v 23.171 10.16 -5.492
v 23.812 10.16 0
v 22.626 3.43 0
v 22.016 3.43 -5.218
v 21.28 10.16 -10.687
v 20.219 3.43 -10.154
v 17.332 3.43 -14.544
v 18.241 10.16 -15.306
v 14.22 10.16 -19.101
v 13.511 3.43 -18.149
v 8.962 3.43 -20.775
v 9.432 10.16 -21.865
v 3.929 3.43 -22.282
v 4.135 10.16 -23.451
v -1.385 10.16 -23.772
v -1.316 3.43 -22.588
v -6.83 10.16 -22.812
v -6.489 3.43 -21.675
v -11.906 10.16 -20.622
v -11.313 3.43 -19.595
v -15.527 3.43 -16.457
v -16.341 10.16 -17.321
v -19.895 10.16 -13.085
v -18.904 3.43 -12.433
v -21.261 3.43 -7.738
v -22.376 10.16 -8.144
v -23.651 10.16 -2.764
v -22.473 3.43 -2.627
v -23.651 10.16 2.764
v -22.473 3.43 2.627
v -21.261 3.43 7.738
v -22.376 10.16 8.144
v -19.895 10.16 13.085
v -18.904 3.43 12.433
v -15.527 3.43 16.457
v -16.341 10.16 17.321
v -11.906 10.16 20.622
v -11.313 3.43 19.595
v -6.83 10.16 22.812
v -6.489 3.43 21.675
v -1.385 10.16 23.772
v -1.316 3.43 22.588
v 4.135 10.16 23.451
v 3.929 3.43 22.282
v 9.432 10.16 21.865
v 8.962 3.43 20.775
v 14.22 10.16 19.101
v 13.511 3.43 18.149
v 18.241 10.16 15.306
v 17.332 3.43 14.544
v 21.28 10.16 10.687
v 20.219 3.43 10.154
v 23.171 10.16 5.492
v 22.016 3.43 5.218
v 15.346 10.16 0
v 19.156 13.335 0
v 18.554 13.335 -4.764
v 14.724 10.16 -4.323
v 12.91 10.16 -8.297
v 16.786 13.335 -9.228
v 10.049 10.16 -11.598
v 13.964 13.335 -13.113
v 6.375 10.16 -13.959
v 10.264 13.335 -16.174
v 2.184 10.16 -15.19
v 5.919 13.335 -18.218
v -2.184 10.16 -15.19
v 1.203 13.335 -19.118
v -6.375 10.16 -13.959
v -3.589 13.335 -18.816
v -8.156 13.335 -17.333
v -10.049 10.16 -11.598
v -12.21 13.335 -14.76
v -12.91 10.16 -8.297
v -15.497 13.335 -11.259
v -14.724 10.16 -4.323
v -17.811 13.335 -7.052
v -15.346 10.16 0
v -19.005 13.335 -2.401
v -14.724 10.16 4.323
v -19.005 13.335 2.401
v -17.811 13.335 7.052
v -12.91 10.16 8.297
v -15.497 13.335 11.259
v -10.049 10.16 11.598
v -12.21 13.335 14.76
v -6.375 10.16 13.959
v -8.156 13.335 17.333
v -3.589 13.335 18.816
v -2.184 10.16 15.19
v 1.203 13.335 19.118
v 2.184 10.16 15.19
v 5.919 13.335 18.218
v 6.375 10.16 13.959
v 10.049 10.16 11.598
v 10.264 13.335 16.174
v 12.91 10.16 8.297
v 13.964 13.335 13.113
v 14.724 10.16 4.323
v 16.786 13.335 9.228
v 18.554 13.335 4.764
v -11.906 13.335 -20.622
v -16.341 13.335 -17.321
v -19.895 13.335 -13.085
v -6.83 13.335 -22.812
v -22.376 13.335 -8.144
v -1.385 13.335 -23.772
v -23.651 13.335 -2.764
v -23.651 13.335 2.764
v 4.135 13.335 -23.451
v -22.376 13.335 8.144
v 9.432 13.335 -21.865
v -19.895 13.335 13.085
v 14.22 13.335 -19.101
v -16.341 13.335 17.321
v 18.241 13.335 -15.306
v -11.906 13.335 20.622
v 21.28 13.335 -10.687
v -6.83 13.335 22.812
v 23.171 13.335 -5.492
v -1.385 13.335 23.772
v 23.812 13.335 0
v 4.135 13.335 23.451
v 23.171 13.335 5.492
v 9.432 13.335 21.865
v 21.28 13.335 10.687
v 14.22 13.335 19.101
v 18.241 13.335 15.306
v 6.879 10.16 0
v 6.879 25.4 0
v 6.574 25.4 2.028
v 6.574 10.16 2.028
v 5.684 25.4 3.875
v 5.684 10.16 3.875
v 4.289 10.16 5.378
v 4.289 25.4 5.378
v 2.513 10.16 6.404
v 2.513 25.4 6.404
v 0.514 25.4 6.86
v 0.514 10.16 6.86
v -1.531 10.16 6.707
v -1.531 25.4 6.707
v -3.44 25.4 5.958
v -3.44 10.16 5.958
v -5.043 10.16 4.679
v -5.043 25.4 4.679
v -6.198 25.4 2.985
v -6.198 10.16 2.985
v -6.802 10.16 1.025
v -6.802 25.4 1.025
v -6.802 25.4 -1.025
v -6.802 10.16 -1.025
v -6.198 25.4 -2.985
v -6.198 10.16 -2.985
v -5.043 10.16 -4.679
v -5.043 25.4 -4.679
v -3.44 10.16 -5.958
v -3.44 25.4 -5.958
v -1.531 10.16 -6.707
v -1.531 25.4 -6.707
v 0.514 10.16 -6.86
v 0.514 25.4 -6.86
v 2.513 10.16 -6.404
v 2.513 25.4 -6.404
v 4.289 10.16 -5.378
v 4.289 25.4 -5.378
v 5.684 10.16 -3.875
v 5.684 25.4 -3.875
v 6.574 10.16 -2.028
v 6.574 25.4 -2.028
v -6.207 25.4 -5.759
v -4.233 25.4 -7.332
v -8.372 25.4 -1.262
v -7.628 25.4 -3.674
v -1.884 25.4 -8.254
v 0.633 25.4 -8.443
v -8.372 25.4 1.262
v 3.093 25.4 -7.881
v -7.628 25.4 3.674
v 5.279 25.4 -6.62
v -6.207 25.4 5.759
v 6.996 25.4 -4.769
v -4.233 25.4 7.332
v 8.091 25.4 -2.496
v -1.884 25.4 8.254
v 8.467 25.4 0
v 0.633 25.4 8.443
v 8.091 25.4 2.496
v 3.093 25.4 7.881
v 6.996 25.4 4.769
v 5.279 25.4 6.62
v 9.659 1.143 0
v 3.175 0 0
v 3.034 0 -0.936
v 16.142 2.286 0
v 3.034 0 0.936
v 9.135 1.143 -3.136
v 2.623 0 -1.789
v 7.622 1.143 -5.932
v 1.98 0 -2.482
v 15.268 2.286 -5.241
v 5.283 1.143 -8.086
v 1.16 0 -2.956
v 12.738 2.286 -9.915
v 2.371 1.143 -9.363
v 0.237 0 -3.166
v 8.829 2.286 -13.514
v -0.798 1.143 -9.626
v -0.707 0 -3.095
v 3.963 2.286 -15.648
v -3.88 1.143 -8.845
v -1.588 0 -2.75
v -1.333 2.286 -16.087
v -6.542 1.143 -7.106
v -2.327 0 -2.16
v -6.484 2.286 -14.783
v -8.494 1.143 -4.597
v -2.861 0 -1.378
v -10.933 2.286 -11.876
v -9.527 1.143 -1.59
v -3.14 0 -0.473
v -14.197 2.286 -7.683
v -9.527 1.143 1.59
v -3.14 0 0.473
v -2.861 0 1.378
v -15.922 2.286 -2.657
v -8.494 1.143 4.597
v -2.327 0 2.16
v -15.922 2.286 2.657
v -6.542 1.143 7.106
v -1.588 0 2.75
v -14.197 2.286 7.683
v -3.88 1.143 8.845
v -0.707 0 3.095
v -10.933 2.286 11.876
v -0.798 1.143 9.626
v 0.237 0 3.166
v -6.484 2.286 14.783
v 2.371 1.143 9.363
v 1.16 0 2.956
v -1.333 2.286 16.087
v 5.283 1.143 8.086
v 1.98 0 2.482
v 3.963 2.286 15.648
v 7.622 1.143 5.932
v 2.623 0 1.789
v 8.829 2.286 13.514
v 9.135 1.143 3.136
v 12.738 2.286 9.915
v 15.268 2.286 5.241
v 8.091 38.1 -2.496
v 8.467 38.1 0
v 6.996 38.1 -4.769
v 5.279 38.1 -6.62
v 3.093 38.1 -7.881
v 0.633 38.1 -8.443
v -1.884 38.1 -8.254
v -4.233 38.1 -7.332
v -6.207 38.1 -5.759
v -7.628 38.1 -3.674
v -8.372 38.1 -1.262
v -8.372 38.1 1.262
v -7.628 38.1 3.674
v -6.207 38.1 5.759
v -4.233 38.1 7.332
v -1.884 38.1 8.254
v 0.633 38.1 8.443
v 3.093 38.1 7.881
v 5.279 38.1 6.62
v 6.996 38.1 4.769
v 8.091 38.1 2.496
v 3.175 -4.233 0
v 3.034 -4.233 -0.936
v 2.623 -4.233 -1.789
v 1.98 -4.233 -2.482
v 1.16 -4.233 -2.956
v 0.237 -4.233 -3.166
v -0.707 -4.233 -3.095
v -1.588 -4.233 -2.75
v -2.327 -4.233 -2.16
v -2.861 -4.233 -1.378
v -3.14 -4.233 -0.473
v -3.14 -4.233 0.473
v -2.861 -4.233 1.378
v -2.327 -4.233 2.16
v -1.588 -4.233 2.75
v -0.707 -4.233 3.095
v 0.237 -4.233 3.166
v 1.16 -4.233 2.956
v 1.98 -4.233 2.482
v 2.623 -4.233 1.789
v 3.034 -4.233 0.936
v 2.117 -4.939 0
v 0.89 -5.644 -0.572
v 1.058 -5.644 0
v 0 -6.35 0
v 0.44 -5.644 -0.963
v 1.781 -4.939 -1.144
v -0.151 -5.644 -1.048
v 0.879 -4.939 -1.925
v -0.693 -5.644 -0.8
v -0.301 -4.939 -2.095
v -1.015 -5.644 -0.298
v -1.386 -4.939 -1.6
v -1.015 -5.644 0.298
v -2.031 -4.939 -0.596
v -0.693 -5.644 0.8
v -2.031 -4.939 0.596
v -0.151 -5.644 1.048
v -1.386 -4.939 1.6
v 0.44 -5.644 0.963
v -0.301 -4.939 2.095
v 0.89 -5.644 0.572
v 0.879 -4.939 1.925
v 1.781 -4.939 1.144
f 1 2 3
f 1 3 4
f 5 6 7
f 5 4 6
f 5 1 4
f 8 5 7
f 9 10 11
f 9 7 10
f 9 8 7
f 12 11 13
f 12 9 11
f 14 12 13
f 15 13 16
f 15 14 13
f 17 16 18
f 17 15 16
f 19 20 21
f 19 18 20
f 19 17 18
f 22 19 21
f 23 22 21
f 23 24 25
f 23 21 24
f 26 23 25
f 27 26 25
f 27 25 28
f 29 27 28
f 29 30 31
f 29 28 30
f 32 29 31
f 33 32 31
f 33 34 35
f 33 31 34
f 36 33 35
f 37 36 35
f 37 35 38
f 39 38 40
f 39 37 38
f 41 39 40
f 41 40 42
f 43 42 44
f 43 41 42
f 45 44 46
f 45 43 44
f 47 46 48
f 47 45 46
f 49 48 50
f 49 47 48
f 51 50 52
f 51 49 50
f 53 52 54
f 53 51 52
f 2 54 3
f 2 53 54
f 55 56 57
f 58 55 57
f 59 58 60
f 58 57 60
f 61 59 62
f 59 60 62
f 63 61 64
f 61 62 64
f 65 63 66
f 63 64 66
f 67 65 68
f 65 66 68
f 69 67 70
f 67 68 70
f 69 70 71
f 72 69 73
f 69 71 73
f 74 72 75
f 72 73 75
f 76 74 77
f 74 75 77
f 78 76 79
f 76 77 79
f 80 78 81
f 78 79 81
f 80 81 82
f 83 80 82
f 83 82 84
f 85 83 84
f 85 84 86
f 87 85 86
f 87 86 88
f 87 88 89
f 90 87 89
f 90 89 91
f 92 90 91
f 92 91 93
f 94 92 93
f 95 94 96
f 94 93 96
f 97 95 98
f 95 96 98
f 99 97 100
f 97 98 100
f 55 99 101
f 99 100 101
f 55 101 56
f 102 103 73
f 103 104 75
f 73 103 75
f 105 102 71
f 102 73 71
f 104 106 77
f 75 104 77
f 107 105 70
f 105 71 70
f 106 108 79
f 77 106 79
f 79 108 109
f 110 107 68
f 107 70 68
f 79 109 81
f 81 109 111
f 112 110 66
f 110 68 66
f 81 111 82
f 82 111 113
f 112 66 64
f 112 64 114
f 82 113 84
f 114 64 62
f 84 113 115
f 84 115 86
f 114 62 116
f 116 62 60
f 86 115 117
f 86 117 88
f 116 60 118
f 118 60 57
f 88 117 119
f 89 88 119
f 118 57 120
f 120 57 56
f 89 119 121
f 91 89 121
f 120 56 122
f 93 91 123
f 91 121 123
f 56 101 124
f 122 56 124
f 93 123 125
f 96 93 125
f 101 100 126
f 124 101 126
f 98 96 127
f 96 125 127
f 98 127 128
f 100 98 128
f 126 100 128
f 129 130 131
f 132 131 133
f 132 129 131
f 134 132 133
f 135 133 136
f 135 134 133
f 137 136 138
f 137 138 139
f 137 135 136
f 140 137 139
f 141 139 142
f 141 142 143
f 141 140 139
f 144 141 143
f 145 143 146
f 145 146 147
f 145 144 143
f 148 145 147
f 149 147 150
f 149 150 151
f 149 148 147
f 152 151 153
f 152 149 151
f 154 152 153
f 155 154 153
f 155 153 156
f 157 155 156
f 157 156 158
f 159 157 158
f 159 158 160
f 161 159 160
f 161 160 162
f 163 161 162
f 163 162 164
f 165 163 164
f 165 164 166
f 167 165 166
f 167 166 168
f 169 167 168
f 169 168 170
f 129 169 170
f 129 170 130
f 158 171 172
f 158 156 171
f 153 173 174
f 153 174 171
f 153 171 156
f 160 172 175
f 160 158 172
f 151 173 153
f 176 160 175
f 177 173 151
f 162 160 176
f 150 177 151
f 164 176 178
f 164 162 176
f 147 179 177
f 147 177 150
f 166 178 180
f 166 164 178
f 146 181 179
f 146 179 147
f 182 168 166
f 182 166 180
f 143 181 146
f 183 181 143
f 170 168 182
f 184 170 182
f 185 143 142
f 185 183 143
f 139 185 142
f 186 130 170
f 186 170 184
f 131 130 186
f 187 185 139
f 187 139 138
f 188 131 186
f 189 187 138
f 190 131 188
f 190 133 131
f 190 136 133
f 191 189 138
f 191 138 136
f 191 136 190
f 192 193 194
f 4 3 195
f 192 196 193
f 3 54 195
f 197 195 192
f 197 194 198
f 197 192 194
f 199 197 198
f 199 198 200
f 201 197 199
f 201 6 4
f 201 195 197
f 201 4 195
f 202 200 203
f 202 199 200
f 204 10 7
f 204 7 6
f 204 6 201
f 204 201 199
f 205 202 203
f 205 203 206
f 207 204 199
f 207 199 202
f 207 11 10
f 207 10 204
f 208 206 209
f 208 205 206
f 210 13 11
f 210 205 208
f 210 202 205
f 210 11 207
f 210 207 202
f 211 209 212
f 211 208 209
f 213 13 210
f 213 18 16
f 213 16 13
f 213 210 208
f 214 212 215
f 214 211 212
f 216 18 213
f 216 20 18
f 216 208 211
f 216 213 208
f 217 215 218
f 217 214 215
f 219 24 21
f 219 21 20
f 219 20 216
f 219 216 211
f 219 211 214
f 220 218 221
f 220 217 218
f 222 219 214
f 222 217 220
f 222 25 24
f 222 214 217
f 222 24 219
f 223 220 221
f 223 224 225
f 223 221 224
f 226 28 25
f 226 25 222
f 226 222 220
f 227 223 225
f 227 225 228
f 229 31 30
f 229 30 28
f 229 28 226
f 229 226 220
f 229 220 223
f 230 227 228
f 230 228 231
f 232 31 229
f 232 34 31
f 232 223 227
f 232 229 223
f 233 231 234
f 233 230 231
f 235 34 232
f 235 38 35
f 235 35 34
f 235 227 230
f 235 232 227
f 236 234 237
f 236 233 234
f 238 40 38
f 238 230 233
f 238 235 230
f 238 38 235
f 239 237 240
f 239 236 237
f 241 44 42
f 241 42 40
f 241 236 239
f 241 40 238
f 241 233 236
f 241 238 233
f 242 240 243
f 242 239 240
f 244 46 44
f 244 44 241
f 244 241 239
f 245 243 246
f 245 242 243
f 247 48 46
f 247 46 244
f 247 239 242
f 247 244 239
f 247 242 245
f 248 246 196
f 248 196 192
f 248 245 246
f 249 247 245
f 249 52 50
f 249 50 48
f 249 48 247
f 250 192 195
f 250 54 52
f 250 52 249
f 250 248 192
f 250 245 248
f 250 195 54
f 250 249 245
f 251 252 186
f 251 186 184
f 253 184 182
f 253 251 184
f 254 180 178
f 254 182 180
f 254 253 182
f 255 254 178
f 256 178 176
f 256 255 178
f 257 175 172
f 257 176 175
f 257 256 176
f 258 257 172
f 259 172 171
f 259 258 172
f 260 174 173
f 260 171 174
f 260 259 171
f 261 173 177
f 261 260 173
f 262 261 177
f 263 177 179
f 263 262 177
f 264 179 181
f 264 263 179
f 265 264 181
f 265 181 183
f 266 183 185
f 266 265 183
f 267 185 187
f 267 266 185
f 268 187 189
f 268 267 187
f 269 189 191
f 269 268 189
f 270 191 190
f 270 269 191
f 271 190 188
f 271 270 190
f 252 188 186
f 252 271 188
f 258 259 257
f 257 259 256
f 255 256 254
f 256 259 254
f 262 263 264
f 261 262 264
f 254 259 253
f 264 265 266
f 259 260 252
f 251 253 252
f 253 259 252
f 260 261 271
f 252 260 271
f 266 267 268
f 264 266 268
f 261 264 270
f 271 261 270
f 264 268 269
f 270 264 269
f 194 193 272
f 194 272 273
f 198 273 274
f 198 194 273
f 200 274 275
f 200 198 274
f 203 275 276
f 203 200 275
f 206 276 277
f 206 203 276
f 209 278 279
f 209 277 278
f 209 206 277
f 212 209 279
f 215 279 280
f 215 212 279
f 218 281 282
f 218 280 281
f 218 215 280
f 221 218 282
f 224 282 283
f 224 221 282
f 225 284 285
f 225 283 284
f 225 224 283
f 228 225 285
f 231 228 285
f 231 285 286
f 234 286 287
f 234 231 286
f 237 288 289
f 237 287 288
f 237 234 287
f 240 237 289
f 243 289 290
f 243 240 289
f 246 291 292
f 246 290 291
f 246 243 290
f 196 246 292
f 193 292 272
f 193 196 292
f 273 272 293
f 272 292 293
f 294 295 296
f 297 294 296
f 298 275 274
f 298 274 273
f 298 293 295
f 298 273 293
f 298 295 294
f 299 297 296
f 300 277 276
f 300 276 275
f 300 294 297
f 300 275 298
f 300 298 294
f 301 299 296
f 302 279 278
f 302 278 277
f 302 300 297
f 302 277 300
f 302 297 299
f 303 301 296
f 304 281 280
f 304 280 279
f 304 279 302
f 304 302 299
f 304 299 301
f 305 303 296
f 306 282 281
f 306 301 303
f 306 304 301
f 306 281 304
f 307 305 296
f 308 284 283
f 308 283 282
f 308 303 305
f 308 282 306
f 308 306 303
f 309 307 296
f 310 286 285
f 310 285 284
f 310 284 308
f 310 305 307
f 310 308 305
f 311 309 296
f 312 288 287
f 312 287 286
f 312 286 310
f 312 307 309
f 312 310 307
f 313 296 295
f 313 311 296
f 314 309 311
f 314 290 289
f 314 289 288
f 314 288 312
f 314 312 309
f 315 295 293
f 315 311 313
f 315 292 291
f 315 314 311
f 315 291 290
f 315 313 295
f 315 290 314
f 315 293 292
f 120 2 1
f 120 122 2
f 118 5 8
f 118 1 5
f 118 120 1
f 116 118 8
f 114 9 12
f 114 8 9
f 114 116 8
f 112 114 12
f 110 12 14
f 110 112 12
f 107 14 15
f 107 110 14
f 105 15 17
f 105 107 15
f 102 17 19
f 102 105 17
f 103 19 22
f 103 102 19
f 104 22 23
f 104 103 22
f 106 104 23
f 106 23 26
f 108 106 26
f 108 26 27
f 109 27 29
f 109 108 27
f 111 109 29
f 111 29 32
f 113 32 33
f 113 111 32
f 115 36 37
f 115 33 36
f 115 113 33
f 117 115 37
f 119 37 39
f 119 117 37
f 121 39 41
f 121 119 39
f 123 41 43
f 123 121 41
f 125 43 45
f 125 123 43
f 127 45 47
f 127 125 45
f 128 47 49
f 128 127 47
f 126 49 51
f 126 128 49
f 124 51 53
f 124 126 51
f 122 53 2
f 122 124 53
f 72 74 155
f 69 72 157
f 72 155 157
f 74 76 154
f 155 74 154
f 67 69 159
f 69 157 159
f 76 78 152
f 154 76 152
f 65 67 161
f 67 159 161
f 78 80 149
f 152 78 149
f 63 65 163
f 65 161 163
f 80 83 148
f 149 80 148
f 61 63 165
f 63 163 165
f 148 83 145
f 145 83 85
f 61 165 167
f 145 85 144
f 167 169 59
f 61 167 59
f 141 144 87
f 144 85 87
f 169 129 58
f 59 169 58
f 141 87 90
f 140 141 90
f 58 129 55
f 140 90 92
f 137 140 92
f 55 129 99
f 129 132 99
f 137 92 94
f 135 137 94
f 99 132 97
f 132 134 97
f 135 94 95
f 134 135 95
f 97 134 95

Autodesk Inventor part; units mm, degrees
ref_plane "YZ Plane" through (0, 0, 0) normal (1, 0, 0) x (0, 1, 0)
ref_plane "XZ Plane" through (0, 0, 0) normal (0, 1, 0) x (-1, 0, 0)
ref_plane "XY Plane" through (0, 0, 0) normal (0, 0, 1) x (1, 0, 0)
sketch "Sketch1" plane through (0, 0, 0) normal (0, 0, 1) x (1, 0, 0)
  line L0 (0, 0) -> (0, 25.4)
  line L1 (0, 0) -> (0, -6.35)
  line L2 (0, 25.4) -> (0, 38.1)
  line L3 (8.4667, 25.4) -> (8.4667, 38.1)
  line L4 (8.4667, 38.1) -> (0, 38.1)
  line L5 (3.175, 17.0324) -> (0, 17.0324) construction
  line L6 (8.4667, 25.4) -> (6.8792, 25.4)
  line L7 (6.8792, 25.4) -> (0, 25.4) construction
  line L8 (0, 0) -> (3.175, 0) construction
  line L9 (3.175, 0) -> (17.91, 0) construction
  line L10 (22.6258, 3.4297) -> (23.8125, 10.16)
  line L11 (23.8125, 10.16) -> (23.8125, 13.335)
  line L12 (15.3458, 10.16) -> (6.8792, 10.16)
  line L13 (19.1558, 13.335) -> (23.8125, 13.335)
  line L14 (0, -6.35) -> (3.175, -4.2333)
  line L15 (3.175, -4.2333) -> (3.175, 0)
  line L16 (15.3458, 10.16) -> (19.1558, 13.335)
  line L17 (3.175, 0) -> (22.6258, 3.4297)
  line L18 (6.8792, 25.4) -> (6.8792, 10.16)
  dimension "d5" = 44.45
  dimension "d6" = 12.7
  dimension "d7" = 8.4667
  dimension "d12" = 2.1167
  dimension "d13" = 3.175
  dimension "d15" = 4.2333
  dimension "d18" = 3.175
  dimension "d20" = 3.175
  dimension "d21" = 3.81
  dimension "d23" = 10.16
  dimension "d24" = 10
  dimension "d26" = 23.8125
  dimension "d27" = 110
  dimension "d28" = 1.5875
  dimension "d29" = 8.4667
revolve "Revolution1" add sketch "Sketch1" angle 360 about axis through (0, 25.4, 0) along (0, -1, 0)
properties part number "Top1"
